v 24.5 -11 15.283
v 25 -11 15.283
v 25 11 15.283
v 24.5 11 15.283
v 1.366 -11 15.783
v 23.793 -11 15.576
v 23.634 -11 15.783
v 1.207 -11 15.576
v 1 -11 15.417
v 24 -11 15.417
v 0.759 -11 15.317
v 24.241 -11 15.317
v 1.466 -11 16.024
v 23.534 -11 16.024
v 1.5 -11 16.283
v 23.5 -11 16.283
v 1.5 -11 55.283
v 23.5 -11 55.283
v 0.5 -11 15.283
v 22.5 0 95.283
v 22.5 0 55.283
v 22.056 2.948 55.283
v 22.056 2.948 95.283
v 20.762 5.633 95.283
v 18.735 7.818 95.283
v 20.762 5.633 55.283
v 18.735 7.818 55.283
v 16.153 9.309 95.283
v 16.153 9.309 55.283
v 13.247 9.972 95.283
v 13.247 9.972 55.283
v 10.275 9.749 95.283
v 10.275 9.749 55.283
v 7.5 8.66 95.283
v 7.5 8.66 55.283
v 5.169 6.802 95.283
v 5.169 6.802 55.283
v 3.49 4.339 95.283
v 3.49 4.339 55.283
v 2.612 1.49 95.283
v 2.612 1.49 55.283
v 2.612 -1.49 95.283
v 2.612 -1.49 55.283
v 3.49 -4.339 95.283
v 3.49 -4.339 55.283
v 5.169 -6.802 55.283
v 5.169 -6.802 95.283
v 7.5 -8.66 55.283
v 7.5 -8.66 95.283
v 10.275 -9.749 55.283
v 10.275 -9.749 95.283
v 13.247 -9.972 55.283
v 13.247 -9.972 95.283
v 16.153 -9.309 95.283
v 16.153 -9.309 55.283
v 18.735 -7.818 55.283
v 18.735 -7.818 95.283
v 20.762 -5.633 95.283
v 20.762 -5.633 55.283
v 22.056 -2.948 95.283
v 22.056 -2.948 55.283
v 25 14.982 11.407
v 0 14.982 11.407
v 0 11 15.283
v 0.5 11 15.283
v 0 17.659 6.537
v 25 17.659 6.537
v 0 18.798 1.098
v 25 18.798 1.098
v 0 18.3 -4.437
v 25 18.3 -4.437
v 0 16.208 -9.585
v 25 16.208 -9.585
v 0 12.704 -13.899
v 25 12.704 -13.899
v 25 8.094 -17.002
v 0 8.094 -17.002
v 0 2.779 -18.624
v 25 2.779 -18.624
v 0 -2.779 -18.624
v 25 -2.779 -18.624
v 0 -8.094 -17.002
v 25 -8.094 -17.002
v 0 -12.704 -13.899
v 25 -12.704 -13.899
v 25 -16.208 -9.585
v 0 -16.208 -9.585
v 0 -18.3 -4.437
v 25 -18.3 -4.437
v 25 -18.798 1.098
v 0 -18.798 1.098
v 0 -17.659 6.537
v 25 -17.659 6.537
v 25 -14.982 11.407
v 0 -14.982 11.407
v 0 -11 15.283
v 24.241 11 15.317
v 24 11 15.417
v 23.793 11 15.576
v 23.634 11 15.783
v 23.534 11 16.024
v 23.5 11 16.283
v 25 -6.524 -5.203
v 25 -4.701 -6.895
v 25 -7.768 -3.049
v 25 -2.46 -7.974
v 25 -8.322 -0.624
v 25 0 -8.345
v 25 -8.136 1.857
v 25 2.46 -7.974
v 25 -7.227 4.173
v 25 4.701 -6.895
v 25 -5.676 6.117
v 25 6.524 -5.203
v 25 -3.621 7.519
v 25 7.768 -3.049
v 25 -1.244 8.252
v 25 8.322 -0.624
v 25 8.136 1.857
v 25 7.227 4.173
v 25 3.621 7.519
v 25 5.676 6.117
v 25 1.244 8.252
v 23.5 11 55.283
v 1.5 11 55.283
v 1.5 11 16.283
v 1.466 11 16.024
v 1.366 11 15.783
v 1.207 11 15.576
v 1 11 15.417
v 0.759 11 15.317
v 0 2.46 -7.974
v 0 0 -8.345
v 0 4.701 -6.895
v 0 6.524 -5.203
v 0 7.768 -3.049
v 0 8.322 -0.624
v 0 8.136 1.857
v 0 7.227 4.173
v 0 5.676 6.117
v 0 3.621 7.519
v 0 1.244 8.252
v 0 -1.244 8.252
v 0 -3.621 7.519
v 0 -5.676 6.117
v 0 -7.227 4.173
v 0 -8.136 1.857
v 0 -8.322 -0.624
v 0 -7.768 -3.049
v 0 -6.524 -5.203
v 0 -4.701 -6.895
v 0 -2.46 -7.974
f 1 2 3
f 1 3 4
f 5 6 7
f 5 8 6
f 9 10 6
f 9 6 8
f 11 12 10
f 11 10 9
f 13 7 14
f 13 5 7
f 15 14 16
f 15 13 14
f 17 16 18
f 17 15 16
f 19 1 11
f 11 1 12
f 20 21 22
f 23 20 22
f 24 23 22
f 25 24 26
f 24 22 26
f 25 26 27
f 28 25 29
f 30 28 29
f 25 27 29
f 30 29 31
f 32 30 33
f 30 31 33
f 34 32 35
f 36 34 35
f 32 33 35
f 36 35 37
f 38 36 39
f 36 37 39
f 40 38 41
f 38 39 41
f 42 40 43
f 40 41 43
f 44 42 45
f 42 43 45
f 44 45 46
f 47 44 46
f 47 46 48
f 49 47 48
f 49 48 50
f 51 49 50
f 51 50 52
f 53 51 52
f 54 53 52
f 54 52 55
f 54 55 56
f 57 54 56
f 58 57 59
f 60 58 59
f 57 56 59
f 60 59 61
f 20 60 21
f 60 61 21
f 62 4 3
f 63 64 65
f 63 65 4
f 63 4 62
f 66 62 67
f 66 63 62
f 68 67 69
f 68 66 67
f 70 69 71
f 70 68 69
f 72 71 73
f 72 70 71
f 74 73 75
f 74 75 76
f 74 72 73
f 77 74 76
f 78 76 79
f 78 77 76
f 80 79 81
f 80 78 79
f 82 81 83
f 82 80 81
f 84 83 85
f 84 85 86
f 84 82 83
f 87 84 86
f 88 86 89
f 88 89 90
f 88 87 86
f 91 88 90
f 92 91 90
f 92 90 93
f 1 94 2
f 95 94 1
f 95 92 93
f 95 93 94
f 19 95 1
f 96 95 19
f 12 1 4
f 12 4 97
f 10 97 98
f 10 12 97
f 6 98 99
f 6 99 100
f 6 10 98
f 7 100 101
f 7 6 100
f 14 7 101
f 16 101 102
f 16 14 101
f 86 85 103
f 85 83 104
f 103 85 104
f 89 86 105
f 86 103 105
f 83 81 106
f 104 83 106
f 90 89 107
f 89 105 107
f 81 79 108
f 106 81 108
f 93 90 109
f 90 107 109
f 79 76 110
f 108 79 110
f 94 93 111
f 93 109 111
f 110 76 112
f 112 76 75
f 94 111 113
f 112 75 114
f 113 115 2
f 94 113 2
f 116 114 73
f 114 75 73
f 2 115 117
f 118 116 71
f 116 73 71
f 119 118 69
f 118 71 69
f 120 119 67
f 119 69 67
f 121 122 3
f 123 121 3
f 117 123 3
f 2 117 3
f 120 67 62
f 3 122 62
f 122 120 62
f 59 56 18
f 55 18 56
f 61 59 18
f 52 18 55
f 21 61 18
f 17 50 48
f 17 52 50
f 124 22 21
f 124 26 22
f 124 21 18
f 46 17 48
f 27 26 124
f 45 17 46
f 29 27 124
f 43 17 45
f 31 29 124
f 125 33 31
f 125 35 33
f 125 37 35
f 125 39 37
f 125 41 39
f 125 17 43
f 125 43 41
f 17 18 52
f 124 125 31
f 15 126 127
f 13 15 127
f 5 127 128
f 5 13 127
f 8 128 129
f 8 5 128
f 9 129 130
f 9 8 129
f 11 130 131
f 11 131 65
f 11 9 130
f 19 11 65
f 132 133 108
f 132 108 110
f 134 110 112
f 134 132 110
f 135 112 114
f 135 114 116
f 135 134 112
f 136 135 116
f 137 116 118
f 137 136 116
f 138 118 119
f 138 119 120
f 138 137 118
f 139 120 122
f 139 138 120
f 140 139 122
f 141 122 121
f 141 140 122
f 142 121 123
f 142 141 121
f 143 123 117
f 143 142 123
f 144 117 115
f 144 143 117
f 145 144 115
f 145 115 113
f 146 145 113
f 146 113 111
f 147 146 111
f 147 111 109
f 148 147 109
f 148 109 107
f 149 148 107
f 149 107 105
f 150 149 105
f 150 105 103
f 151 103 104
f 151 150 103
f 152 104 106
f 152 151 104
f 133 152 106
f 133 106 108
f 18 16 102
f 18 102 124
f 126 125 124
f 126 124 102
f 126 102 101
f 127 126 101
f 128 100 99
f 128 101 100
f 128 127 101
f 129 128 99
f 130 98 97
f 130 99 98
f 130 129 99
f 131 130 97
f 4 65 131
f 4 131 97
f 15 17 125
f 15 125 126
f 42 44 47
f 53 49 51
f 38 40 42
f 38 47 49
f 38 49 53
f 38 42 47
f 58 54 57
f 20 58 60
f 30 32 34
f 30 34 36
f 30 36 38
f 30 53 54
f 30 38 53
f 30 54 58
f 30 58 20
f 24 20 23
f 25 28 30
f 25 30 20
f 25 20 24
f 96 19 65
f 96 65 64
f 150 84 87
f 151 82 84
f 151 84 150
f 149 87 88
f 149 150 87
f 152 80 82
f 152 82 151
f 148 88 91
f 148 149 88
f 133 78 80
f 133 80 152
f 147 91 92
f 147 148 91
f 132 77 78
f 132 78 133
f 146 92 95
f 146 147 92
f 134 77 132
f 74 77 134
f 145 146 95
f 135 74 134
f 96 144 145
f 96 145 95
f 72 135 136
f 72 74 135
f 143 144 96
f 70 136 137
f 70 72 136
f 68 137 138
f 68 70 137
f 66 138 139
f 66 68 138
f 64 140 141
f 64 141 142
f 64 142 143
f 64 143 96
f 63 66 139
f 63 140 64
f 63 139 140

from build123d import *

# Parameters (mm, degrees)
SKETCH1_R           = 8.345
BOSS_EXTRUDE1_DEPTH = 25
CUT_EXTRUDE3_START  = -11
CUT_EXTRUDE3_DEPTH  = 22
SKETCH3_R           = 10
BOSS_EXTRUDE2_DEPTH = 40


# Read off the part's stored shape, not the designer's step: Cut-Extrude3
with BuildPart() as part:
    # Sketch1 → Boss-Extrude1 (new body)
    with BuildSketch(Plane(origin=(0, 0, 0), x_dir=(0, 0, -1), z_dir=(1, 0, 0))):
        with BuildLine():
            Line((-15.282961101, -11), (-55.282961101, -11))
            Line((-55.282961101, -11), (-55.282961101, 11))
            Line((-55.282961101, 11), (-15.282961101, 11))
            ThreePointArc((-15.282961101, 11), (18.83, 0), (-15.282961101, -11))
        make_face()
        Circle(SKETCH1_R, mode=Mode.SUBTRACT)
    extrude(amount=BOSS_EXTRUDE1_DEPTH)

    # Cut-Extrude3 outline → Cut-Extrude3 (cut)
    with BuildSketch(Plane(origin=(0, 0, 0), x_dir=(1, 0, 0), z_dir=(0, 1, 0)).offset(CUT_EXTRUDE3_START)):
        with BuildLine():
            Line((25, -55.282961101), (25, -15.282961101))
            Line((25, -15.282961101), (24.5, -15.282961101))
            ThreePointArc((24.5, -15.282961101), (23.792893218, -15.575854319), (23.5, -16.282961101))
            Line((23.5, -16.282961101), (23.5, -55.282961101))
            Line((23.5, -55.282961101), (25, -55.282961101))
        make_face()
        with BuildLine():
            Line((0, -55.282961101), (1.5, -55.282961101))
            Line((1.5, -55.282961101), (1.5, -16.282961101))
            ThreePointArc((1.5, -16.282961101), (1.207106782, -15.575854319), (0.5, -15.282961101))
            Line((0.5, -15.282961101), (0, -15.282961101))
            Line((0, -15.282961101), (0, -55.282961101))
        make_face()
    extrude(amount=CUT_EXTRUDE3_DEPTH, mode=Mode.SUBTRACT)

    # Sketch3 → Boss-Extrude2 (add)
    with BuildSketch(Plane.XY.offset(55.282961101)):
        with Locations((12.5, 0)):
            Circle(SKETCH3_R)
    extrude(amount=BOSS_EXTRUDE2_DEPTH)


solid = part.part
